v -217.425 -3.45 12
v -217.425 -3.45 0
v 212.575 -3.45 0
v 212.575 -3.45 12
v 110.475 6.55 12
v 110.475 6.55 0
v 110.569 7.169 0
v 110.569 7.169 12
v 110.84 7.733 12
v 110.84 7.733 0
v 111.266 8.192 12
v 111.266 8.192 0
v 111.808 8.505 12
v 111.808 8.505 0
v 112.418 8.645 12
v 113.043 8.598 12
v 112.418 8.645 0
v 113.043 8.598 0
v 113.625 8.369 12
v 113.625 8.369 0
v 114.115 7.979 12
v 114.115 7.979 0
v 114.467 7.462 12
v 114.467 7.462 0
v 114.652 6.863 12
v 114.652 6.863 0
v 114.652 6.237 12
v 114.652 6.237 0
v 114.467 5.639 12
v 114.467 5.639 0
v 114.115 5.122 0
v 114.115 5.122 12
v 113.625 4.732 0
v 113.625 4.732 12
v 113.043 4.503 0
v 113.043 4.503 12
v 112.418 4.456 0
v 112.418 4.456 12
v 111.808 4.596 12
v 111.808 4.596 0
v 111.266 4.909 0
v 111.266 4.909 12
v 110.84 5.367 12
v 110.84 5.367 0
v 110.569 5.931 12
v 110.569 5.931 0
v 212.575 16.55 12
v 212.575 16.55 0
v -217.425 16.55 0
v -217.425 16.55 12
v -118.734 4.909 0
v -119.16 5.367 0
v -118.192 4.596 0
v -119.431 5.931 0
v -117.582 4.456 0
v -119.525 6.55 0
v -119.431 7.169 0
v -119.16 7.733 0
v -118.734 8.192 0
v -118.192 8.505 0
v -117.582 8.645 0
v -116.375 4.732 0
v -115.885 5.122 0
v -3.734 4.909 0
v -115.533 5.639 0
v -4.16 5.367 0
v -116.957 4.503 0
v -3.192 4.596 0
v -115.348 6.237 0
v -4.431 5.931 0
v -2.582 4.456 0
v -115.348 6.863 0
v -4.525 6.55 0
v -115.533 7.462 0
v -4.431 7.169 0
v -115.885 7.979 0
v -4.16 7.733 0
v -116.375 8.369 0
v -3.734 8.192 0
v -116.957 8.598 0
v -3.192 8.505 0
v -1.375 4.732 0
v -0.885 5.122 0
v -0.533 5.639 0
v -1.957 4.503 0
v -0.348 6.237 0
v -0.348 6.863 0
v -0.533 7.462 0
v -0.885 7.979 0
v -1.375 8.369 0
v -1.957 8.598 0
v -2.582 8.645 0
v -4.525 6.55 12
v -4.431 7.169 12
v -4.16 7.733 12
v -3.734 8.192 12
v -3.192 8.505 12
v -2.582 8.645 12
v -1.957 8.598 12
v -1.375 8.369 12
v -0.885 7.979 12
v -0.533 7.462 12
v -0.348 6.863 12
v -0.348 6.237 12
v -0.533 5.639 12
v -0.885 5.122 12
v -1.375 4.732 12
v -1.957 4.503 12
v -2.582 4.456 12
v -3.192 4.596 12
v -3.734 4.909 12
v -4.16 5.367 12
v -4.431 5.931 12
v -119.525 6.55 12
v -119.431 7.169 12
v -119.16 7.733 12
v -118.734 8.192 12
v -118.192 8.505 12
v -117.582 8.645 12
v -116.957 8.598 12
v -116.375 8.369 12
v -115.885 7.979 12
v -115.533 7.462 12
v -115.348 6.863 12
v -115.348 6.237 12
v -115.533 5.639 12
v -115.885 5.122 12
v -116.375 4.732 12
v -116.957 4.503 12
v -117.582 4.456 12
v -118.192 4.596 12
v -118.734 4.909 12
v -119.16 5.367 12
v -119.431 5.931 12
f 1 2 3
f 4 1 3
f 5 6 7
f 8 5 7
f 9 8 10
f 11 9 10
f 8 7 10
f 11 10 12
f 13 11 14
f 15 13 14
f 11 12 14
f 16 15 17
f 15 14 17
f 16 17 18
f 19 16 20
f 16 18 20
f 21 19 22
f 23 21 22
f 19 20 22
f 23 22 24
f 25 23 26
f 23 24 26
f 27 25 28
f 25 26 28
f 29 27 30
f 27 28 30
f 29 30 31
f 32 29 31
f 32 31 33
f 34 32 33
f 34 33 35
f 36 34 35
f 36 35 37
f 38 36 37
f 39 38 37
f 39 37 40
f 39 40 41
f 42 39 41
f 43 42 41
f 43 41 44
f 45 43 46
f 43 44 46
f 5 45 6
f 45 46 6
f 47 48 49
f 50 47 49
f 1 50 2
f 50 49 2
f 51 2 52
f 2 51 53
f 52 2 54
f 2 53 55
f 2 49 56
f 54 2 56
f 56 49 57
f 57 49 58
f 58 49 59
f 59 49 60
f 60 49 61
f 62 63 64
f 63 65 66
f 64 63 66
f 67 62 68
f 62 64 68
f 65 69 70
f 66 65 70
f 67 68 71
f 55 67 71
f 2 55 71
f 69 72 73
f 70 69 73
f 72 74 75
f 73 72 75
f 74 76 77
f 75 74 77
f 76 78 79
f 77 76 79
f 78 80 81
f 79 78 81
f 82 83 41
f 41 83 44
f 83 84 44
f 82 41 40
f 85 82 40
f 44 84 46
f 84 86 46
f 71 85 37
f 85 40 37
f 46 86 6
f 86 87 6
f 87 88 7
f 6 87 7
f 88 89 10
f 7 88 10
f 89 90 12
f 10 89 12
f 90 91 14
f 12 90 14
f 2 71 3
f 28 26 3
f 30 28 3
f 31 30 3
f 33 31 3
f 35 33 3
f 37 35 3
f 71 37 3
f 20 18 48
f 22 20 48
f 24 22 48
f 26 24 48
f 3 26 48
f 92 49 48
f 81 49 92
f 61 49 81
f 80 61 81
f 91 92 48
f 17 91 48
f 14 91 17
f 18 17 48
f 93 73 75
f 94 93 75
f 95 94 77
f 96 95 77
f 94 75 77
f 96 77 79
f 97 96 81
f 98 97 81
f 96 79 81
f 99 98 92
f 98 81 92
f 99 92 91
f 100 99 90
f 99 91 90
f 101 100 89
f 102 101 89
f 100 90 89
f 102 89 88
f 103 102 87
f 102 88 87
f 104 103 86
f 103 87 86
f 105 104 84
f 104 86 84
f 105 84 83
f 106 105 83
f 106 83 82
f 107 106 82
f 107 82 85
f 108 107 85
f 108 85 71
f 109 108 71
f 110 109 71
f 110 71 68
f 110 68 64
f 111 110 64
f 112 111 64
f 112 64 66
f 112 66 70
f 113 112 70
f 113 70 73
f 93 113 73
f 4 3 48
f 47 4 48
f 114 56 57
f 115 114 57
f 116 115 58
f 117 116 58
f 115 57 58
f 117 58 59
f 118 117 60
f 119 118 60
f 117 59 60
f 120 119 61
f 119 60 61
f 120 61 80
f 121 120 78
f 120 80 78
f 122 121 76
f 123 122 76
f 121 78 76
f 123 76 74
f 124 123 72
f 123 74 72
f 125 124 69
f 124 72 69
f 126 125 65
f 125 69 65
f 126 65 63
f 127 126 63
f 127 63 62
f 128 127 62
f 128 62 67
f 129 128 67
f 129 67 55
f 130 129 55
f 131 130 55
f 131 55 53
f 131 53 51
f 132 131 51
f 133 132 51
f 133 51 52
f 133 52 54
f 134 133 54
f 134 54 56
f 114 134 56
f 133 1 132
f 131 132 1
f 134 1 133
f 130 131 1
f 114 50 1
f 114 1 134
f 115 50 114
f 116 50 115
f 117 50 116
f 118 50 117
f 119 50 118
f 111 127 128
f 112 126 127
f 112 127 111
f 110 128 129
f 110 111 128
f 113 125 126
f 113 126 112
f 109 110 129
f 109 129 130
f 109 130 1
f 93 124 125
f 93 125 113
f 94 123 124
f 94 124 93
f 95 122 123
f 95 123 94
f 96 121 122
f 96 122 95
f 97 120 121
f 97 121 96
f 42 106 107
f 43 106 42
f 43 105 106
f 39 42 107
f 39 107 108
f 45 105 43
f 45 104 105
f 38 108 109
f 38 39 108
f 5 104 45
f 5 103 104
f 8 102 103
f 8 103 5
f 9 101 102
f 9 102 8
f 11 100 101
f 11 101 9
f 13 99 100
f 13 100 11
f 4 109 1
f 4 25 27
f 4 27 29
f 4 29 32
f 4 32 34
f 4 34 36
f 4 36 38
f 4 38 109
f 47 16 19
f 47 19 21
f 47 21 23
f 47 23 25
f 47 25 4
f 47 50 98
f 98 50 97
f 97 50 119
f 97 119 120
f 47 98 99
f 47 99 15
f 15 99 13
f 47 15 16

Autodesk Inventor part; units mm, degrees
ref_plane "YZ Plane" through (0, 0, 0) normal (1, 0, 0) x (0, 1, 0)
ref_plane "XZ Plane" through (0, 0, 0) normal (0, 1, 0) x (-1, 0, 0)
ref_plane "XY Plane" through (0, 0, 0) normal (0, 0, 1) x (1, 0, 0)
sketch "Sketch1" plane through (0, 0, 0) normal (0, 0, 1) x (1, 0, 0)
  line L0 (-212.4247, -46.9955) -> (-212.4247, -61.9955) projected
  line L1 (-212.4247, -61.9955) -> (213.9753, -61.9955) projected
  line L2 (213.9753, -61.9955) -> (213.9753, -46.9955) projected
  line L3 (213.9753, -46.9955) -> (-212.4247, -46.9955) projected
  line L4 (213.9754, 278.5874) -> (243.9754, 278.5874) projected
  line L5 (243.9754, 278.5874) -> (243.9753, -71.9955) projected
  line L6 (243.9753, -71.9955) -> (-242.4247, -71.9955) projected
  line L7 (-242.4247, -71.9955) -> (-242.4246, 278.5875) projected
  line L8 (-242.4246, 278.5875) -> (-212.4246, 278.5875) projected
  line L9 (-212.4246, 278.5875) -> (-212.4247, -21.9955) projected
  line L10 (-212.4247, -21.9955) -> (213.9753, -21.9955) projected
  line L11 (213.9753, -21.9955) -> (213.9754, 278.5874) projected
  line L12 (-217.4247, -3.4496) -> (212.5753, -3.4496)
  line L13 (212.5753, -3.4496) -> (212.5753, 16.5504)
  line L14 (212.5753, 16.5504) -> (-217.4247, 16.5504)
  line L15 (-217.4247, 16.5504) -> (-217.4247, -3.4496)
  point P0 (0, 0)
  dimension "d1" = 20
  dimension "d11" = 430
extrude "Extrusion1" add sketch "Sketch1" along normal blind 12 contours L12 L15 L14 L9 | L9 L14 L13 L12
sketch "Sketch2" plane through (0, 0, 0) normal (0, 0, -1) x (-1, 0, 0)
  line L0 (217.4247, -3.4496) -> (-212.5753, -3.4496) construction
  line L1 (2.4247, -3.4496) -> (2.4247, 18.0985) construction
  line L2 (217.4247, 16.5504) -> (217.4247, -3.4496) construction
  line L3 (217.4247, 6.5504) -> (-212.5753, 6.5504) construction
  line L4 (-212.5753, -3.4496) -> (-212.5753, 16.5504) construction
  circle A0 centre (117.4247, 6.5504) radius 2.1
  circle A1 centre (-112.5753, 6.5504) radius 2.1
  circle A2 centre (2.4247, 6.5504) radius 2.1
  point P0 (0, 0)
  dimension "d4" = 4.2
  dimension "d5" = 100
  dimension "d6" = 4.2
  dimension "d7" = 100
  dimension "d8" = 4.2
extrude "Extrusion2" cut sketch "Sketch2" against normal through all
properties part number "Wiper Springloaded 1"
